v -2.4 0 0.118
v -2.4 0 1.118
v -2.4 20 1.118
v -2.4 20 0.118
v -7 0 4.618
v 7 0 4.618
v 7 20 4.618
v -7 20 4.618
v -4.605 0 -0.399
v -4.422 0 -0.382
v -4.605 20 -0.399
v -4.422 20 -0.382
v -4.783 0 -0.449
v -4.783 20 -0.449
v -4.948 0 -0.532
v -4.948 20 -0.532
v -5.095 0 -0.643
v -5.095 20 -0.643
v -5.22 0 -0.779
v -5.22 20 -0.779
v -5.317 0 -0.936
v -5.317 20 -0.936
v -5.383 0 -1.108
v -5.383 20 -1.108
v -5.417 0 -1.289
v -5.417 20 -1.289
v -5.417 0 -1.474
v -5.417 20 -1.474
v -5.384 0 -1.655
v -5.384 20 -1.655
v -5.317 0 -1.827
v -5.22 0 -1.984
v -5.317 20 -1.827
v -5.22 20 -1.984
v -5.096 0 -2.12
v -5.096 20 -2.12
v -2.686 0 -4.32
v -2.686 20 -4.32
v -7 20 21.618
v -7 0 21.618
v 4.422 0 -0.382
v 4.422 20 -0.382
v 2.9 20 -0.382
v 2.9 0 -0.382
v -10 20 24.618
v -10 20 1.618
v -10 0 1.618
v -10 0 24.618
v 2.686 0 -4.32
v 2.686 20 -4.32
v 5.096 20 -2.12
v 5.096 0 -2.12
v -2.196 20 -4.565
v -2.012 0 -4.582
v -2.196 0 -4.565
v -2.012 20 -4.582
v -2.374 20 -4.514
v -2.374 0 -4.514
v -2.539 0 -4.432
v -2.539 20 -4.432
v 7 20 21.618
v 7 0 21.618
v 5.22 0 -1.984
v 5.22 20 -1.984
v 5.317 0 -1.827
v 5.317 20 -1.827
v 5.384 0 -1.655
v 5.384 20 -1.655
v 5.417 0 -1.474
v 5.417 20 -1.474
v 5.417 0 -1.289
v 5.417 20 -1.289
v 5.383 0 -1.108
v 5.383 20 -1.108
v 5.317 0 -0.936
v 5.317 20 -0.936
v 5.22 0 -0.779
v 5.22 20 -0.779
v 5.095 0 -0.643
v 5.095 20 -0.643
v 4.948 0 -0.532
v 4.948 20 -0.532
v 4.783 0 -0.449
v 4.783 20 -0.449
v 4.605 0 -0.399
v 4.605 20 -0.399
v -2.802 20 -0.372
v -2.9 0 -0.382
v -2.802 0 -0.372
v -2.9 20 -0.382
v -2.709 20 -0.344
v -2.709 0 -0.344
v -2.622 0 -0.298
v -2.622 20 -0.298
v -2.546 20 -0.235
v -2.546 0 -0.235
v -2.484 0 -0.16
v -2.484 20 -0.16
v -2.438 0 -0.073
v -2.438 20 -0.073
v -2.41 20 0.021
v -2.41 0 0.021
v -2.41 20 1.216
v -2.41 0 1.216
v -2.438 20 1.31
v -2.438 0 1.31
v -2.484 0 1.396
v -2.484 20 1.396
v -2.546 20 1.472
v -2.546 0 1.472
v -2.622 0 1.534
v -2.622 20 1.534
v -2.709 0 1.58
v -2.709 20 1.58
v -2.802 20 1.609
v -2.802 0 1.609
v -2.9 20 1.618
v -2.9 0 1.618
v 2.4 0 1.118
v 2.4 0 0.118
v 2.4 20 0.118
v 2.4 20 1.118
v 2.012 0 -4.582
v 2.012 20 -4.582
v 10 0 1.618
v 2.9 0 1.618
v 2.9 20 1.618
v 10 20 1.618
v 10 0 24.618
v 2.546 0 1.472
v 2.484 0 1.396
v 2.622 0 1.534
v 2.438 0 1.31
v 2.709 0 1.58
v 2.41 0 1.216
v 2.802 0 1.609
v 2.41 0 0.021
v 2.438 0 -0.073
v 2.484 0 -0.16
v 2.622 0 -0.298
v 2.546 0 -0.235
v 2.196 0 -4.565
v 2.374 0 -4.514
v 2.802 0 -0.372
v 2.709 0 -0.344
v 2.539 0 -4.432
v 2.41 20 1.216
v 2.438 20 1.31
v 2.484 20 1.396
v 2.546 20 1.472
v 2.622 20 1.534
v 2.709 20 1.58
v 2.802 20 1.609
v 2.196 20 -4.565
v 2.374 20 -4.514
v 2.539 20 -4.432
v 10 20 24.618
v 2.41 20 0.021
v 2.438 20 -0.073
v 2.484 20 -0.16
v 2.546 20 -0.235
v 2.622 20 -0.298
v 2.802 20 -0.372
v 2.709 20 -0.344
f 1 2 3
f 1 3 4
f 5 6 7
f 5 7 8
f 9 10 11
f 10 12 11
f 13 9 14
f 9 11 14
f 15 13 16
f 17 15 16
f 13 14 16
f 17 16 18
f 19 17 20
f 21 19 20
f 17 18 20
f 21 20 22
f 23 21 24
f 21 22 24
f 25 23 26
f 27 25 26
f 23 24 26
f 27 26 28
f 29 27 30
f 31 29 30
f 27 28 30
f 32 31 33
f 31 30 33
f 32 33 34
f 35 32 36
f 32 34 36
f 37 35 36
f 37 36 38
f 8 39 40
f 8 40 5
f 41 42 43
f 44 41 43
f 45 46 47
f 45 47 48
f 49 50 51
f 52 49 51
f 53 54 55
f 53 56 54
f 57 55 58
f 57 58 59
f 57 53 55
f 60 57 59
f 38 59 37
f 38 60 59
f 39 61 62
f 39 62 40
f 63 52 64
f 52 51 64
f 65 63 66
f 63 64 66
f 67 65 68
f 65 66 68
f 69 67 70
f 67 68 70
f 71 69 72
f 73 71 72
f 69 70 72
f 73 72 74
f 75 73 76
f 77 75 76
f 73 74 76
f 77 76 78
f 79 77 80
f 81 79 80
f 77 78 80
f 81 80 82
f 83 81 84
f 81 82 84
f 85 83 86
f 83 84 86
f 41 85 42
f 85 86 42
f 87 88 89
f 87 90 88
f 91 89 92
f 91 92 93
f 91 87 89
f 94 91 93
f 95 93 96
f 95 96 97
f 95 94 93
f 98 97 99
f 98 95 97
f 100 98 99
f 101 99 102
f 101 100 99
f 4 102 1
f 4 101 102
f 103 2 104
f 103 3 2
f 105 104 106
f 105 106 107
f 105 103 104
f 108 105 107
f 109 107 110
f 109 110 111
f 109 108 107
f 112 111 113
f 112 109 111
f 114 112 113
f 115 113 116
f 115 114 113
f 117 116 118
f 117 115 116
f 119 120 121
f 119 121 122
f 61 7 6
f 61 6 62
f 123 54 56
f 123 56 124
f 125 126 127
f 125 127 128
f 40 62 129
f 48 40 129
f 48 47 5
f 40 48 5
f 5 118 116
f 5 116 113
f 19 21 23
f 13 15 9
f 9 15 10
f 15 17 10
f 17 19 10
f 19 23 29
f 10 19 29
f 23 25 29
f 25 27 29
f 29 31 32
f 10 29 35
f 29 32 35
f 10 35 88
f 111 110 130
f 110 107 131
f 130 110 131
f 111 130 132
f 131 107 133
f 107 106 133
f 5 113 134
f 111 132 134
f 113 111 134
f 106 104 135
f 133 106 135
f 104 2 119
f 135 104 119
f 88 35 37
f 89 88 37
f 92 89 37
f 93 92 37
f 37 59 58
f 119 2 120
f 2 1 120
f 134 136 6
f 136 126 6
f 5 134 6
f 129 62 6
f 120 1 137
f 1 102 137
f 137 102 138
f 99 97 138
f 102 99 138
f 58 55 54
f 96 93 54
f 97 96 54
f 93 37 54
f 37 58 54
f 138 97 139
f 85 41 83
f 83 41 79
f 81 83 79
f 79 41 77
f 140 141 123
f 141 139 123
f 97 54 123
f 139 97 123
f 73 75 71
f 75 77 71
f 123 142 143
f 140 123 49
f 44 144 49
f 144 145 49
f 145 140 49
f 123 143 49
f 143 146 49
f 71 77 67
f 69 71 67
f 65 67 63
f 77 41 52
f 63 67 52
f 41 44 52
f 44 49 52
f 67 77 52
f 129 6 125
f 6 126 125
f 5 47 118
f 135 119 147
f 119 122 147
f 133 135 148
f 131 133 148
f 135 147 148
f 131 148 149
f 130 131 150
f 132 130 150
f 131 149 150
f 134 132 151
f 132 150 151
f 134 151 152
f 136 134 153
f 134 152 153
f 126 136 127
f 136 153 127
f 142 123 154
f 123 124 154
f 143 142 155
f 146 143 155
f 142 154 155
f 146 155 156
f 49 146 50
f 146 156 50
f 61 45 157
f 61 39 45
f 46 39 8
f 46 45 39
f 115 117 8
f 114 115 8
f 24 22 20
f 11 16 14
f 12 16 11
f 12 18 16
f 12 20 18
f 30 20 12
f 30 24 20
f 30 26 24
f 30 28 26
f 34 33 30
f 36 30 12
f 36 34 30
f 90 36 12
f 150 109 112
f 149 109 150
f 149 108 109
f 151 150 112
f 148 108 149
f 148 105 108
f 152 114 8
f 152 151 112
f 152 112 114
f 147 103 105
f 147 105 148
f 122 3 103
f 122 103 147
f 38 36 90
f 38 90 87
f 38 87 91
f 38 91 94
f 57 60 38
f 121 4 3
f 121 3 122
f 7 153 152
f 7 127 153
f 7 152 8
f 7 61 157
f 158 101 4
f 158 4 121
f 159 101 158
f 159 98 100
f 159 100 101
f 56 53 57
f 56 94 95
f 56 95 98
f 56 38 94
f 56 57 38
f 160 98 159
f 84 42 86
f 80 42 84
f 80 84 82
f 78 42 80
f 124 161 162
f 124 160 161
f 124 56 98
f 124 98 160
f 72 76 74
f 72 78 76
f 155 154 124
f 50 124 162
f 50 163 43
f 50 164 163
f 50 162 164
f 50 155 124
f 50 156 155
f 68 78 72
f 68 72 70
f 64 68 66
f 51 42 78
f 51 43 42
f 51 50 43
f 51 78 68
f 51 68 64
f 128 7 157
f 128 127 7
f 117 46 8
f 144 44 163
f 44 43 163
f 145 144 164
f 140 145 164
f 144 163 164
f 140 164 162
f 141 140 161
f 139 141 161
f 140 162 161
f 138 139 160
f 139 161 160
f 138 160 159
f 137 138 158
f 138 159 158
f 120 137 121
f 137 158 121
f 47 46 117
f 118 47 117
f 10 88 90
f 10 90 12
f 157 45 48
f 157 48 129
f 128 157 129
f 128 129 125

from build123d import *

# Parameters (mm, degrees)
BOSS_EXTRUDE1_DEPTH = 20
FILLET1_R           = 1
FILLET2_R           = 0.5
BOSS_EXTRUDE2_DEPTH = 20


with BuildPart() as part:
    # Sketch1 → Boss-Extrude1 (new body)
    with BuildSketch(Plane(origin=(0, 0, 0), x_dir=(1, 0, 0), z_dir=(0, 1, 0))):
        Polygon((-2.4, 4.581818182), (2.4, 4.581818182), (7, 0.381818182), (2.4, 0.381818182), (2.4, -1.618181818), (10, -1.618181818), (10, -4.618181818), (-10, -4.618181818), (-10, -1.618181818), (-2.4, -1.618181818), (-2.4, 0.381818182), (-7, 0.381818182), align=None)
    extrude(amount=BOSS_EXTRUDE1_DEPTH)

    # Fillet1
    fillet1_edges = [part.edges().sort_by_distance(p)[0] for p in [
        (7, 10, -0.381818182),
        (-7, 10, -0.381818182),
        (-2.4, 10, -4.581818182),
        (2.4, 10, -4.581818182),
    ]]
    fillet(fillet1_edges, radius=FILLET1_R)

    # Fillet2
    fillet2_edges = [part.edges().sort_by_distance(p)[0] for p in [
        (2.4, 10, -0.381818182),
        (2.4, 10, 1.618181818),
        (-2.4, 10, 1.618181818),
        (-2.4, 10, -0.381818182),
    ]]
    fillet(fillet2_edges, radius=FILLET2_R)

    # Sketch2 → Boss-Extrude2 (add)
    with BuildSketch(Plane(origin=(0, 20, 0), x_dir=(1, 0, 0), z_dir=(0, 1, 0))):
        Polygon((-7, -4.618181818), (-10, -4.618181818), (-10, -24.618181818), (10, -24.618181818), (10, -4.618181818), (7, -4.618181818), (7, -21.618181818), (-7, -21.618181818), align=None)
    extrude(amount=-BOSS_EXTRUDE2_DEPTH)


solid = part.part
